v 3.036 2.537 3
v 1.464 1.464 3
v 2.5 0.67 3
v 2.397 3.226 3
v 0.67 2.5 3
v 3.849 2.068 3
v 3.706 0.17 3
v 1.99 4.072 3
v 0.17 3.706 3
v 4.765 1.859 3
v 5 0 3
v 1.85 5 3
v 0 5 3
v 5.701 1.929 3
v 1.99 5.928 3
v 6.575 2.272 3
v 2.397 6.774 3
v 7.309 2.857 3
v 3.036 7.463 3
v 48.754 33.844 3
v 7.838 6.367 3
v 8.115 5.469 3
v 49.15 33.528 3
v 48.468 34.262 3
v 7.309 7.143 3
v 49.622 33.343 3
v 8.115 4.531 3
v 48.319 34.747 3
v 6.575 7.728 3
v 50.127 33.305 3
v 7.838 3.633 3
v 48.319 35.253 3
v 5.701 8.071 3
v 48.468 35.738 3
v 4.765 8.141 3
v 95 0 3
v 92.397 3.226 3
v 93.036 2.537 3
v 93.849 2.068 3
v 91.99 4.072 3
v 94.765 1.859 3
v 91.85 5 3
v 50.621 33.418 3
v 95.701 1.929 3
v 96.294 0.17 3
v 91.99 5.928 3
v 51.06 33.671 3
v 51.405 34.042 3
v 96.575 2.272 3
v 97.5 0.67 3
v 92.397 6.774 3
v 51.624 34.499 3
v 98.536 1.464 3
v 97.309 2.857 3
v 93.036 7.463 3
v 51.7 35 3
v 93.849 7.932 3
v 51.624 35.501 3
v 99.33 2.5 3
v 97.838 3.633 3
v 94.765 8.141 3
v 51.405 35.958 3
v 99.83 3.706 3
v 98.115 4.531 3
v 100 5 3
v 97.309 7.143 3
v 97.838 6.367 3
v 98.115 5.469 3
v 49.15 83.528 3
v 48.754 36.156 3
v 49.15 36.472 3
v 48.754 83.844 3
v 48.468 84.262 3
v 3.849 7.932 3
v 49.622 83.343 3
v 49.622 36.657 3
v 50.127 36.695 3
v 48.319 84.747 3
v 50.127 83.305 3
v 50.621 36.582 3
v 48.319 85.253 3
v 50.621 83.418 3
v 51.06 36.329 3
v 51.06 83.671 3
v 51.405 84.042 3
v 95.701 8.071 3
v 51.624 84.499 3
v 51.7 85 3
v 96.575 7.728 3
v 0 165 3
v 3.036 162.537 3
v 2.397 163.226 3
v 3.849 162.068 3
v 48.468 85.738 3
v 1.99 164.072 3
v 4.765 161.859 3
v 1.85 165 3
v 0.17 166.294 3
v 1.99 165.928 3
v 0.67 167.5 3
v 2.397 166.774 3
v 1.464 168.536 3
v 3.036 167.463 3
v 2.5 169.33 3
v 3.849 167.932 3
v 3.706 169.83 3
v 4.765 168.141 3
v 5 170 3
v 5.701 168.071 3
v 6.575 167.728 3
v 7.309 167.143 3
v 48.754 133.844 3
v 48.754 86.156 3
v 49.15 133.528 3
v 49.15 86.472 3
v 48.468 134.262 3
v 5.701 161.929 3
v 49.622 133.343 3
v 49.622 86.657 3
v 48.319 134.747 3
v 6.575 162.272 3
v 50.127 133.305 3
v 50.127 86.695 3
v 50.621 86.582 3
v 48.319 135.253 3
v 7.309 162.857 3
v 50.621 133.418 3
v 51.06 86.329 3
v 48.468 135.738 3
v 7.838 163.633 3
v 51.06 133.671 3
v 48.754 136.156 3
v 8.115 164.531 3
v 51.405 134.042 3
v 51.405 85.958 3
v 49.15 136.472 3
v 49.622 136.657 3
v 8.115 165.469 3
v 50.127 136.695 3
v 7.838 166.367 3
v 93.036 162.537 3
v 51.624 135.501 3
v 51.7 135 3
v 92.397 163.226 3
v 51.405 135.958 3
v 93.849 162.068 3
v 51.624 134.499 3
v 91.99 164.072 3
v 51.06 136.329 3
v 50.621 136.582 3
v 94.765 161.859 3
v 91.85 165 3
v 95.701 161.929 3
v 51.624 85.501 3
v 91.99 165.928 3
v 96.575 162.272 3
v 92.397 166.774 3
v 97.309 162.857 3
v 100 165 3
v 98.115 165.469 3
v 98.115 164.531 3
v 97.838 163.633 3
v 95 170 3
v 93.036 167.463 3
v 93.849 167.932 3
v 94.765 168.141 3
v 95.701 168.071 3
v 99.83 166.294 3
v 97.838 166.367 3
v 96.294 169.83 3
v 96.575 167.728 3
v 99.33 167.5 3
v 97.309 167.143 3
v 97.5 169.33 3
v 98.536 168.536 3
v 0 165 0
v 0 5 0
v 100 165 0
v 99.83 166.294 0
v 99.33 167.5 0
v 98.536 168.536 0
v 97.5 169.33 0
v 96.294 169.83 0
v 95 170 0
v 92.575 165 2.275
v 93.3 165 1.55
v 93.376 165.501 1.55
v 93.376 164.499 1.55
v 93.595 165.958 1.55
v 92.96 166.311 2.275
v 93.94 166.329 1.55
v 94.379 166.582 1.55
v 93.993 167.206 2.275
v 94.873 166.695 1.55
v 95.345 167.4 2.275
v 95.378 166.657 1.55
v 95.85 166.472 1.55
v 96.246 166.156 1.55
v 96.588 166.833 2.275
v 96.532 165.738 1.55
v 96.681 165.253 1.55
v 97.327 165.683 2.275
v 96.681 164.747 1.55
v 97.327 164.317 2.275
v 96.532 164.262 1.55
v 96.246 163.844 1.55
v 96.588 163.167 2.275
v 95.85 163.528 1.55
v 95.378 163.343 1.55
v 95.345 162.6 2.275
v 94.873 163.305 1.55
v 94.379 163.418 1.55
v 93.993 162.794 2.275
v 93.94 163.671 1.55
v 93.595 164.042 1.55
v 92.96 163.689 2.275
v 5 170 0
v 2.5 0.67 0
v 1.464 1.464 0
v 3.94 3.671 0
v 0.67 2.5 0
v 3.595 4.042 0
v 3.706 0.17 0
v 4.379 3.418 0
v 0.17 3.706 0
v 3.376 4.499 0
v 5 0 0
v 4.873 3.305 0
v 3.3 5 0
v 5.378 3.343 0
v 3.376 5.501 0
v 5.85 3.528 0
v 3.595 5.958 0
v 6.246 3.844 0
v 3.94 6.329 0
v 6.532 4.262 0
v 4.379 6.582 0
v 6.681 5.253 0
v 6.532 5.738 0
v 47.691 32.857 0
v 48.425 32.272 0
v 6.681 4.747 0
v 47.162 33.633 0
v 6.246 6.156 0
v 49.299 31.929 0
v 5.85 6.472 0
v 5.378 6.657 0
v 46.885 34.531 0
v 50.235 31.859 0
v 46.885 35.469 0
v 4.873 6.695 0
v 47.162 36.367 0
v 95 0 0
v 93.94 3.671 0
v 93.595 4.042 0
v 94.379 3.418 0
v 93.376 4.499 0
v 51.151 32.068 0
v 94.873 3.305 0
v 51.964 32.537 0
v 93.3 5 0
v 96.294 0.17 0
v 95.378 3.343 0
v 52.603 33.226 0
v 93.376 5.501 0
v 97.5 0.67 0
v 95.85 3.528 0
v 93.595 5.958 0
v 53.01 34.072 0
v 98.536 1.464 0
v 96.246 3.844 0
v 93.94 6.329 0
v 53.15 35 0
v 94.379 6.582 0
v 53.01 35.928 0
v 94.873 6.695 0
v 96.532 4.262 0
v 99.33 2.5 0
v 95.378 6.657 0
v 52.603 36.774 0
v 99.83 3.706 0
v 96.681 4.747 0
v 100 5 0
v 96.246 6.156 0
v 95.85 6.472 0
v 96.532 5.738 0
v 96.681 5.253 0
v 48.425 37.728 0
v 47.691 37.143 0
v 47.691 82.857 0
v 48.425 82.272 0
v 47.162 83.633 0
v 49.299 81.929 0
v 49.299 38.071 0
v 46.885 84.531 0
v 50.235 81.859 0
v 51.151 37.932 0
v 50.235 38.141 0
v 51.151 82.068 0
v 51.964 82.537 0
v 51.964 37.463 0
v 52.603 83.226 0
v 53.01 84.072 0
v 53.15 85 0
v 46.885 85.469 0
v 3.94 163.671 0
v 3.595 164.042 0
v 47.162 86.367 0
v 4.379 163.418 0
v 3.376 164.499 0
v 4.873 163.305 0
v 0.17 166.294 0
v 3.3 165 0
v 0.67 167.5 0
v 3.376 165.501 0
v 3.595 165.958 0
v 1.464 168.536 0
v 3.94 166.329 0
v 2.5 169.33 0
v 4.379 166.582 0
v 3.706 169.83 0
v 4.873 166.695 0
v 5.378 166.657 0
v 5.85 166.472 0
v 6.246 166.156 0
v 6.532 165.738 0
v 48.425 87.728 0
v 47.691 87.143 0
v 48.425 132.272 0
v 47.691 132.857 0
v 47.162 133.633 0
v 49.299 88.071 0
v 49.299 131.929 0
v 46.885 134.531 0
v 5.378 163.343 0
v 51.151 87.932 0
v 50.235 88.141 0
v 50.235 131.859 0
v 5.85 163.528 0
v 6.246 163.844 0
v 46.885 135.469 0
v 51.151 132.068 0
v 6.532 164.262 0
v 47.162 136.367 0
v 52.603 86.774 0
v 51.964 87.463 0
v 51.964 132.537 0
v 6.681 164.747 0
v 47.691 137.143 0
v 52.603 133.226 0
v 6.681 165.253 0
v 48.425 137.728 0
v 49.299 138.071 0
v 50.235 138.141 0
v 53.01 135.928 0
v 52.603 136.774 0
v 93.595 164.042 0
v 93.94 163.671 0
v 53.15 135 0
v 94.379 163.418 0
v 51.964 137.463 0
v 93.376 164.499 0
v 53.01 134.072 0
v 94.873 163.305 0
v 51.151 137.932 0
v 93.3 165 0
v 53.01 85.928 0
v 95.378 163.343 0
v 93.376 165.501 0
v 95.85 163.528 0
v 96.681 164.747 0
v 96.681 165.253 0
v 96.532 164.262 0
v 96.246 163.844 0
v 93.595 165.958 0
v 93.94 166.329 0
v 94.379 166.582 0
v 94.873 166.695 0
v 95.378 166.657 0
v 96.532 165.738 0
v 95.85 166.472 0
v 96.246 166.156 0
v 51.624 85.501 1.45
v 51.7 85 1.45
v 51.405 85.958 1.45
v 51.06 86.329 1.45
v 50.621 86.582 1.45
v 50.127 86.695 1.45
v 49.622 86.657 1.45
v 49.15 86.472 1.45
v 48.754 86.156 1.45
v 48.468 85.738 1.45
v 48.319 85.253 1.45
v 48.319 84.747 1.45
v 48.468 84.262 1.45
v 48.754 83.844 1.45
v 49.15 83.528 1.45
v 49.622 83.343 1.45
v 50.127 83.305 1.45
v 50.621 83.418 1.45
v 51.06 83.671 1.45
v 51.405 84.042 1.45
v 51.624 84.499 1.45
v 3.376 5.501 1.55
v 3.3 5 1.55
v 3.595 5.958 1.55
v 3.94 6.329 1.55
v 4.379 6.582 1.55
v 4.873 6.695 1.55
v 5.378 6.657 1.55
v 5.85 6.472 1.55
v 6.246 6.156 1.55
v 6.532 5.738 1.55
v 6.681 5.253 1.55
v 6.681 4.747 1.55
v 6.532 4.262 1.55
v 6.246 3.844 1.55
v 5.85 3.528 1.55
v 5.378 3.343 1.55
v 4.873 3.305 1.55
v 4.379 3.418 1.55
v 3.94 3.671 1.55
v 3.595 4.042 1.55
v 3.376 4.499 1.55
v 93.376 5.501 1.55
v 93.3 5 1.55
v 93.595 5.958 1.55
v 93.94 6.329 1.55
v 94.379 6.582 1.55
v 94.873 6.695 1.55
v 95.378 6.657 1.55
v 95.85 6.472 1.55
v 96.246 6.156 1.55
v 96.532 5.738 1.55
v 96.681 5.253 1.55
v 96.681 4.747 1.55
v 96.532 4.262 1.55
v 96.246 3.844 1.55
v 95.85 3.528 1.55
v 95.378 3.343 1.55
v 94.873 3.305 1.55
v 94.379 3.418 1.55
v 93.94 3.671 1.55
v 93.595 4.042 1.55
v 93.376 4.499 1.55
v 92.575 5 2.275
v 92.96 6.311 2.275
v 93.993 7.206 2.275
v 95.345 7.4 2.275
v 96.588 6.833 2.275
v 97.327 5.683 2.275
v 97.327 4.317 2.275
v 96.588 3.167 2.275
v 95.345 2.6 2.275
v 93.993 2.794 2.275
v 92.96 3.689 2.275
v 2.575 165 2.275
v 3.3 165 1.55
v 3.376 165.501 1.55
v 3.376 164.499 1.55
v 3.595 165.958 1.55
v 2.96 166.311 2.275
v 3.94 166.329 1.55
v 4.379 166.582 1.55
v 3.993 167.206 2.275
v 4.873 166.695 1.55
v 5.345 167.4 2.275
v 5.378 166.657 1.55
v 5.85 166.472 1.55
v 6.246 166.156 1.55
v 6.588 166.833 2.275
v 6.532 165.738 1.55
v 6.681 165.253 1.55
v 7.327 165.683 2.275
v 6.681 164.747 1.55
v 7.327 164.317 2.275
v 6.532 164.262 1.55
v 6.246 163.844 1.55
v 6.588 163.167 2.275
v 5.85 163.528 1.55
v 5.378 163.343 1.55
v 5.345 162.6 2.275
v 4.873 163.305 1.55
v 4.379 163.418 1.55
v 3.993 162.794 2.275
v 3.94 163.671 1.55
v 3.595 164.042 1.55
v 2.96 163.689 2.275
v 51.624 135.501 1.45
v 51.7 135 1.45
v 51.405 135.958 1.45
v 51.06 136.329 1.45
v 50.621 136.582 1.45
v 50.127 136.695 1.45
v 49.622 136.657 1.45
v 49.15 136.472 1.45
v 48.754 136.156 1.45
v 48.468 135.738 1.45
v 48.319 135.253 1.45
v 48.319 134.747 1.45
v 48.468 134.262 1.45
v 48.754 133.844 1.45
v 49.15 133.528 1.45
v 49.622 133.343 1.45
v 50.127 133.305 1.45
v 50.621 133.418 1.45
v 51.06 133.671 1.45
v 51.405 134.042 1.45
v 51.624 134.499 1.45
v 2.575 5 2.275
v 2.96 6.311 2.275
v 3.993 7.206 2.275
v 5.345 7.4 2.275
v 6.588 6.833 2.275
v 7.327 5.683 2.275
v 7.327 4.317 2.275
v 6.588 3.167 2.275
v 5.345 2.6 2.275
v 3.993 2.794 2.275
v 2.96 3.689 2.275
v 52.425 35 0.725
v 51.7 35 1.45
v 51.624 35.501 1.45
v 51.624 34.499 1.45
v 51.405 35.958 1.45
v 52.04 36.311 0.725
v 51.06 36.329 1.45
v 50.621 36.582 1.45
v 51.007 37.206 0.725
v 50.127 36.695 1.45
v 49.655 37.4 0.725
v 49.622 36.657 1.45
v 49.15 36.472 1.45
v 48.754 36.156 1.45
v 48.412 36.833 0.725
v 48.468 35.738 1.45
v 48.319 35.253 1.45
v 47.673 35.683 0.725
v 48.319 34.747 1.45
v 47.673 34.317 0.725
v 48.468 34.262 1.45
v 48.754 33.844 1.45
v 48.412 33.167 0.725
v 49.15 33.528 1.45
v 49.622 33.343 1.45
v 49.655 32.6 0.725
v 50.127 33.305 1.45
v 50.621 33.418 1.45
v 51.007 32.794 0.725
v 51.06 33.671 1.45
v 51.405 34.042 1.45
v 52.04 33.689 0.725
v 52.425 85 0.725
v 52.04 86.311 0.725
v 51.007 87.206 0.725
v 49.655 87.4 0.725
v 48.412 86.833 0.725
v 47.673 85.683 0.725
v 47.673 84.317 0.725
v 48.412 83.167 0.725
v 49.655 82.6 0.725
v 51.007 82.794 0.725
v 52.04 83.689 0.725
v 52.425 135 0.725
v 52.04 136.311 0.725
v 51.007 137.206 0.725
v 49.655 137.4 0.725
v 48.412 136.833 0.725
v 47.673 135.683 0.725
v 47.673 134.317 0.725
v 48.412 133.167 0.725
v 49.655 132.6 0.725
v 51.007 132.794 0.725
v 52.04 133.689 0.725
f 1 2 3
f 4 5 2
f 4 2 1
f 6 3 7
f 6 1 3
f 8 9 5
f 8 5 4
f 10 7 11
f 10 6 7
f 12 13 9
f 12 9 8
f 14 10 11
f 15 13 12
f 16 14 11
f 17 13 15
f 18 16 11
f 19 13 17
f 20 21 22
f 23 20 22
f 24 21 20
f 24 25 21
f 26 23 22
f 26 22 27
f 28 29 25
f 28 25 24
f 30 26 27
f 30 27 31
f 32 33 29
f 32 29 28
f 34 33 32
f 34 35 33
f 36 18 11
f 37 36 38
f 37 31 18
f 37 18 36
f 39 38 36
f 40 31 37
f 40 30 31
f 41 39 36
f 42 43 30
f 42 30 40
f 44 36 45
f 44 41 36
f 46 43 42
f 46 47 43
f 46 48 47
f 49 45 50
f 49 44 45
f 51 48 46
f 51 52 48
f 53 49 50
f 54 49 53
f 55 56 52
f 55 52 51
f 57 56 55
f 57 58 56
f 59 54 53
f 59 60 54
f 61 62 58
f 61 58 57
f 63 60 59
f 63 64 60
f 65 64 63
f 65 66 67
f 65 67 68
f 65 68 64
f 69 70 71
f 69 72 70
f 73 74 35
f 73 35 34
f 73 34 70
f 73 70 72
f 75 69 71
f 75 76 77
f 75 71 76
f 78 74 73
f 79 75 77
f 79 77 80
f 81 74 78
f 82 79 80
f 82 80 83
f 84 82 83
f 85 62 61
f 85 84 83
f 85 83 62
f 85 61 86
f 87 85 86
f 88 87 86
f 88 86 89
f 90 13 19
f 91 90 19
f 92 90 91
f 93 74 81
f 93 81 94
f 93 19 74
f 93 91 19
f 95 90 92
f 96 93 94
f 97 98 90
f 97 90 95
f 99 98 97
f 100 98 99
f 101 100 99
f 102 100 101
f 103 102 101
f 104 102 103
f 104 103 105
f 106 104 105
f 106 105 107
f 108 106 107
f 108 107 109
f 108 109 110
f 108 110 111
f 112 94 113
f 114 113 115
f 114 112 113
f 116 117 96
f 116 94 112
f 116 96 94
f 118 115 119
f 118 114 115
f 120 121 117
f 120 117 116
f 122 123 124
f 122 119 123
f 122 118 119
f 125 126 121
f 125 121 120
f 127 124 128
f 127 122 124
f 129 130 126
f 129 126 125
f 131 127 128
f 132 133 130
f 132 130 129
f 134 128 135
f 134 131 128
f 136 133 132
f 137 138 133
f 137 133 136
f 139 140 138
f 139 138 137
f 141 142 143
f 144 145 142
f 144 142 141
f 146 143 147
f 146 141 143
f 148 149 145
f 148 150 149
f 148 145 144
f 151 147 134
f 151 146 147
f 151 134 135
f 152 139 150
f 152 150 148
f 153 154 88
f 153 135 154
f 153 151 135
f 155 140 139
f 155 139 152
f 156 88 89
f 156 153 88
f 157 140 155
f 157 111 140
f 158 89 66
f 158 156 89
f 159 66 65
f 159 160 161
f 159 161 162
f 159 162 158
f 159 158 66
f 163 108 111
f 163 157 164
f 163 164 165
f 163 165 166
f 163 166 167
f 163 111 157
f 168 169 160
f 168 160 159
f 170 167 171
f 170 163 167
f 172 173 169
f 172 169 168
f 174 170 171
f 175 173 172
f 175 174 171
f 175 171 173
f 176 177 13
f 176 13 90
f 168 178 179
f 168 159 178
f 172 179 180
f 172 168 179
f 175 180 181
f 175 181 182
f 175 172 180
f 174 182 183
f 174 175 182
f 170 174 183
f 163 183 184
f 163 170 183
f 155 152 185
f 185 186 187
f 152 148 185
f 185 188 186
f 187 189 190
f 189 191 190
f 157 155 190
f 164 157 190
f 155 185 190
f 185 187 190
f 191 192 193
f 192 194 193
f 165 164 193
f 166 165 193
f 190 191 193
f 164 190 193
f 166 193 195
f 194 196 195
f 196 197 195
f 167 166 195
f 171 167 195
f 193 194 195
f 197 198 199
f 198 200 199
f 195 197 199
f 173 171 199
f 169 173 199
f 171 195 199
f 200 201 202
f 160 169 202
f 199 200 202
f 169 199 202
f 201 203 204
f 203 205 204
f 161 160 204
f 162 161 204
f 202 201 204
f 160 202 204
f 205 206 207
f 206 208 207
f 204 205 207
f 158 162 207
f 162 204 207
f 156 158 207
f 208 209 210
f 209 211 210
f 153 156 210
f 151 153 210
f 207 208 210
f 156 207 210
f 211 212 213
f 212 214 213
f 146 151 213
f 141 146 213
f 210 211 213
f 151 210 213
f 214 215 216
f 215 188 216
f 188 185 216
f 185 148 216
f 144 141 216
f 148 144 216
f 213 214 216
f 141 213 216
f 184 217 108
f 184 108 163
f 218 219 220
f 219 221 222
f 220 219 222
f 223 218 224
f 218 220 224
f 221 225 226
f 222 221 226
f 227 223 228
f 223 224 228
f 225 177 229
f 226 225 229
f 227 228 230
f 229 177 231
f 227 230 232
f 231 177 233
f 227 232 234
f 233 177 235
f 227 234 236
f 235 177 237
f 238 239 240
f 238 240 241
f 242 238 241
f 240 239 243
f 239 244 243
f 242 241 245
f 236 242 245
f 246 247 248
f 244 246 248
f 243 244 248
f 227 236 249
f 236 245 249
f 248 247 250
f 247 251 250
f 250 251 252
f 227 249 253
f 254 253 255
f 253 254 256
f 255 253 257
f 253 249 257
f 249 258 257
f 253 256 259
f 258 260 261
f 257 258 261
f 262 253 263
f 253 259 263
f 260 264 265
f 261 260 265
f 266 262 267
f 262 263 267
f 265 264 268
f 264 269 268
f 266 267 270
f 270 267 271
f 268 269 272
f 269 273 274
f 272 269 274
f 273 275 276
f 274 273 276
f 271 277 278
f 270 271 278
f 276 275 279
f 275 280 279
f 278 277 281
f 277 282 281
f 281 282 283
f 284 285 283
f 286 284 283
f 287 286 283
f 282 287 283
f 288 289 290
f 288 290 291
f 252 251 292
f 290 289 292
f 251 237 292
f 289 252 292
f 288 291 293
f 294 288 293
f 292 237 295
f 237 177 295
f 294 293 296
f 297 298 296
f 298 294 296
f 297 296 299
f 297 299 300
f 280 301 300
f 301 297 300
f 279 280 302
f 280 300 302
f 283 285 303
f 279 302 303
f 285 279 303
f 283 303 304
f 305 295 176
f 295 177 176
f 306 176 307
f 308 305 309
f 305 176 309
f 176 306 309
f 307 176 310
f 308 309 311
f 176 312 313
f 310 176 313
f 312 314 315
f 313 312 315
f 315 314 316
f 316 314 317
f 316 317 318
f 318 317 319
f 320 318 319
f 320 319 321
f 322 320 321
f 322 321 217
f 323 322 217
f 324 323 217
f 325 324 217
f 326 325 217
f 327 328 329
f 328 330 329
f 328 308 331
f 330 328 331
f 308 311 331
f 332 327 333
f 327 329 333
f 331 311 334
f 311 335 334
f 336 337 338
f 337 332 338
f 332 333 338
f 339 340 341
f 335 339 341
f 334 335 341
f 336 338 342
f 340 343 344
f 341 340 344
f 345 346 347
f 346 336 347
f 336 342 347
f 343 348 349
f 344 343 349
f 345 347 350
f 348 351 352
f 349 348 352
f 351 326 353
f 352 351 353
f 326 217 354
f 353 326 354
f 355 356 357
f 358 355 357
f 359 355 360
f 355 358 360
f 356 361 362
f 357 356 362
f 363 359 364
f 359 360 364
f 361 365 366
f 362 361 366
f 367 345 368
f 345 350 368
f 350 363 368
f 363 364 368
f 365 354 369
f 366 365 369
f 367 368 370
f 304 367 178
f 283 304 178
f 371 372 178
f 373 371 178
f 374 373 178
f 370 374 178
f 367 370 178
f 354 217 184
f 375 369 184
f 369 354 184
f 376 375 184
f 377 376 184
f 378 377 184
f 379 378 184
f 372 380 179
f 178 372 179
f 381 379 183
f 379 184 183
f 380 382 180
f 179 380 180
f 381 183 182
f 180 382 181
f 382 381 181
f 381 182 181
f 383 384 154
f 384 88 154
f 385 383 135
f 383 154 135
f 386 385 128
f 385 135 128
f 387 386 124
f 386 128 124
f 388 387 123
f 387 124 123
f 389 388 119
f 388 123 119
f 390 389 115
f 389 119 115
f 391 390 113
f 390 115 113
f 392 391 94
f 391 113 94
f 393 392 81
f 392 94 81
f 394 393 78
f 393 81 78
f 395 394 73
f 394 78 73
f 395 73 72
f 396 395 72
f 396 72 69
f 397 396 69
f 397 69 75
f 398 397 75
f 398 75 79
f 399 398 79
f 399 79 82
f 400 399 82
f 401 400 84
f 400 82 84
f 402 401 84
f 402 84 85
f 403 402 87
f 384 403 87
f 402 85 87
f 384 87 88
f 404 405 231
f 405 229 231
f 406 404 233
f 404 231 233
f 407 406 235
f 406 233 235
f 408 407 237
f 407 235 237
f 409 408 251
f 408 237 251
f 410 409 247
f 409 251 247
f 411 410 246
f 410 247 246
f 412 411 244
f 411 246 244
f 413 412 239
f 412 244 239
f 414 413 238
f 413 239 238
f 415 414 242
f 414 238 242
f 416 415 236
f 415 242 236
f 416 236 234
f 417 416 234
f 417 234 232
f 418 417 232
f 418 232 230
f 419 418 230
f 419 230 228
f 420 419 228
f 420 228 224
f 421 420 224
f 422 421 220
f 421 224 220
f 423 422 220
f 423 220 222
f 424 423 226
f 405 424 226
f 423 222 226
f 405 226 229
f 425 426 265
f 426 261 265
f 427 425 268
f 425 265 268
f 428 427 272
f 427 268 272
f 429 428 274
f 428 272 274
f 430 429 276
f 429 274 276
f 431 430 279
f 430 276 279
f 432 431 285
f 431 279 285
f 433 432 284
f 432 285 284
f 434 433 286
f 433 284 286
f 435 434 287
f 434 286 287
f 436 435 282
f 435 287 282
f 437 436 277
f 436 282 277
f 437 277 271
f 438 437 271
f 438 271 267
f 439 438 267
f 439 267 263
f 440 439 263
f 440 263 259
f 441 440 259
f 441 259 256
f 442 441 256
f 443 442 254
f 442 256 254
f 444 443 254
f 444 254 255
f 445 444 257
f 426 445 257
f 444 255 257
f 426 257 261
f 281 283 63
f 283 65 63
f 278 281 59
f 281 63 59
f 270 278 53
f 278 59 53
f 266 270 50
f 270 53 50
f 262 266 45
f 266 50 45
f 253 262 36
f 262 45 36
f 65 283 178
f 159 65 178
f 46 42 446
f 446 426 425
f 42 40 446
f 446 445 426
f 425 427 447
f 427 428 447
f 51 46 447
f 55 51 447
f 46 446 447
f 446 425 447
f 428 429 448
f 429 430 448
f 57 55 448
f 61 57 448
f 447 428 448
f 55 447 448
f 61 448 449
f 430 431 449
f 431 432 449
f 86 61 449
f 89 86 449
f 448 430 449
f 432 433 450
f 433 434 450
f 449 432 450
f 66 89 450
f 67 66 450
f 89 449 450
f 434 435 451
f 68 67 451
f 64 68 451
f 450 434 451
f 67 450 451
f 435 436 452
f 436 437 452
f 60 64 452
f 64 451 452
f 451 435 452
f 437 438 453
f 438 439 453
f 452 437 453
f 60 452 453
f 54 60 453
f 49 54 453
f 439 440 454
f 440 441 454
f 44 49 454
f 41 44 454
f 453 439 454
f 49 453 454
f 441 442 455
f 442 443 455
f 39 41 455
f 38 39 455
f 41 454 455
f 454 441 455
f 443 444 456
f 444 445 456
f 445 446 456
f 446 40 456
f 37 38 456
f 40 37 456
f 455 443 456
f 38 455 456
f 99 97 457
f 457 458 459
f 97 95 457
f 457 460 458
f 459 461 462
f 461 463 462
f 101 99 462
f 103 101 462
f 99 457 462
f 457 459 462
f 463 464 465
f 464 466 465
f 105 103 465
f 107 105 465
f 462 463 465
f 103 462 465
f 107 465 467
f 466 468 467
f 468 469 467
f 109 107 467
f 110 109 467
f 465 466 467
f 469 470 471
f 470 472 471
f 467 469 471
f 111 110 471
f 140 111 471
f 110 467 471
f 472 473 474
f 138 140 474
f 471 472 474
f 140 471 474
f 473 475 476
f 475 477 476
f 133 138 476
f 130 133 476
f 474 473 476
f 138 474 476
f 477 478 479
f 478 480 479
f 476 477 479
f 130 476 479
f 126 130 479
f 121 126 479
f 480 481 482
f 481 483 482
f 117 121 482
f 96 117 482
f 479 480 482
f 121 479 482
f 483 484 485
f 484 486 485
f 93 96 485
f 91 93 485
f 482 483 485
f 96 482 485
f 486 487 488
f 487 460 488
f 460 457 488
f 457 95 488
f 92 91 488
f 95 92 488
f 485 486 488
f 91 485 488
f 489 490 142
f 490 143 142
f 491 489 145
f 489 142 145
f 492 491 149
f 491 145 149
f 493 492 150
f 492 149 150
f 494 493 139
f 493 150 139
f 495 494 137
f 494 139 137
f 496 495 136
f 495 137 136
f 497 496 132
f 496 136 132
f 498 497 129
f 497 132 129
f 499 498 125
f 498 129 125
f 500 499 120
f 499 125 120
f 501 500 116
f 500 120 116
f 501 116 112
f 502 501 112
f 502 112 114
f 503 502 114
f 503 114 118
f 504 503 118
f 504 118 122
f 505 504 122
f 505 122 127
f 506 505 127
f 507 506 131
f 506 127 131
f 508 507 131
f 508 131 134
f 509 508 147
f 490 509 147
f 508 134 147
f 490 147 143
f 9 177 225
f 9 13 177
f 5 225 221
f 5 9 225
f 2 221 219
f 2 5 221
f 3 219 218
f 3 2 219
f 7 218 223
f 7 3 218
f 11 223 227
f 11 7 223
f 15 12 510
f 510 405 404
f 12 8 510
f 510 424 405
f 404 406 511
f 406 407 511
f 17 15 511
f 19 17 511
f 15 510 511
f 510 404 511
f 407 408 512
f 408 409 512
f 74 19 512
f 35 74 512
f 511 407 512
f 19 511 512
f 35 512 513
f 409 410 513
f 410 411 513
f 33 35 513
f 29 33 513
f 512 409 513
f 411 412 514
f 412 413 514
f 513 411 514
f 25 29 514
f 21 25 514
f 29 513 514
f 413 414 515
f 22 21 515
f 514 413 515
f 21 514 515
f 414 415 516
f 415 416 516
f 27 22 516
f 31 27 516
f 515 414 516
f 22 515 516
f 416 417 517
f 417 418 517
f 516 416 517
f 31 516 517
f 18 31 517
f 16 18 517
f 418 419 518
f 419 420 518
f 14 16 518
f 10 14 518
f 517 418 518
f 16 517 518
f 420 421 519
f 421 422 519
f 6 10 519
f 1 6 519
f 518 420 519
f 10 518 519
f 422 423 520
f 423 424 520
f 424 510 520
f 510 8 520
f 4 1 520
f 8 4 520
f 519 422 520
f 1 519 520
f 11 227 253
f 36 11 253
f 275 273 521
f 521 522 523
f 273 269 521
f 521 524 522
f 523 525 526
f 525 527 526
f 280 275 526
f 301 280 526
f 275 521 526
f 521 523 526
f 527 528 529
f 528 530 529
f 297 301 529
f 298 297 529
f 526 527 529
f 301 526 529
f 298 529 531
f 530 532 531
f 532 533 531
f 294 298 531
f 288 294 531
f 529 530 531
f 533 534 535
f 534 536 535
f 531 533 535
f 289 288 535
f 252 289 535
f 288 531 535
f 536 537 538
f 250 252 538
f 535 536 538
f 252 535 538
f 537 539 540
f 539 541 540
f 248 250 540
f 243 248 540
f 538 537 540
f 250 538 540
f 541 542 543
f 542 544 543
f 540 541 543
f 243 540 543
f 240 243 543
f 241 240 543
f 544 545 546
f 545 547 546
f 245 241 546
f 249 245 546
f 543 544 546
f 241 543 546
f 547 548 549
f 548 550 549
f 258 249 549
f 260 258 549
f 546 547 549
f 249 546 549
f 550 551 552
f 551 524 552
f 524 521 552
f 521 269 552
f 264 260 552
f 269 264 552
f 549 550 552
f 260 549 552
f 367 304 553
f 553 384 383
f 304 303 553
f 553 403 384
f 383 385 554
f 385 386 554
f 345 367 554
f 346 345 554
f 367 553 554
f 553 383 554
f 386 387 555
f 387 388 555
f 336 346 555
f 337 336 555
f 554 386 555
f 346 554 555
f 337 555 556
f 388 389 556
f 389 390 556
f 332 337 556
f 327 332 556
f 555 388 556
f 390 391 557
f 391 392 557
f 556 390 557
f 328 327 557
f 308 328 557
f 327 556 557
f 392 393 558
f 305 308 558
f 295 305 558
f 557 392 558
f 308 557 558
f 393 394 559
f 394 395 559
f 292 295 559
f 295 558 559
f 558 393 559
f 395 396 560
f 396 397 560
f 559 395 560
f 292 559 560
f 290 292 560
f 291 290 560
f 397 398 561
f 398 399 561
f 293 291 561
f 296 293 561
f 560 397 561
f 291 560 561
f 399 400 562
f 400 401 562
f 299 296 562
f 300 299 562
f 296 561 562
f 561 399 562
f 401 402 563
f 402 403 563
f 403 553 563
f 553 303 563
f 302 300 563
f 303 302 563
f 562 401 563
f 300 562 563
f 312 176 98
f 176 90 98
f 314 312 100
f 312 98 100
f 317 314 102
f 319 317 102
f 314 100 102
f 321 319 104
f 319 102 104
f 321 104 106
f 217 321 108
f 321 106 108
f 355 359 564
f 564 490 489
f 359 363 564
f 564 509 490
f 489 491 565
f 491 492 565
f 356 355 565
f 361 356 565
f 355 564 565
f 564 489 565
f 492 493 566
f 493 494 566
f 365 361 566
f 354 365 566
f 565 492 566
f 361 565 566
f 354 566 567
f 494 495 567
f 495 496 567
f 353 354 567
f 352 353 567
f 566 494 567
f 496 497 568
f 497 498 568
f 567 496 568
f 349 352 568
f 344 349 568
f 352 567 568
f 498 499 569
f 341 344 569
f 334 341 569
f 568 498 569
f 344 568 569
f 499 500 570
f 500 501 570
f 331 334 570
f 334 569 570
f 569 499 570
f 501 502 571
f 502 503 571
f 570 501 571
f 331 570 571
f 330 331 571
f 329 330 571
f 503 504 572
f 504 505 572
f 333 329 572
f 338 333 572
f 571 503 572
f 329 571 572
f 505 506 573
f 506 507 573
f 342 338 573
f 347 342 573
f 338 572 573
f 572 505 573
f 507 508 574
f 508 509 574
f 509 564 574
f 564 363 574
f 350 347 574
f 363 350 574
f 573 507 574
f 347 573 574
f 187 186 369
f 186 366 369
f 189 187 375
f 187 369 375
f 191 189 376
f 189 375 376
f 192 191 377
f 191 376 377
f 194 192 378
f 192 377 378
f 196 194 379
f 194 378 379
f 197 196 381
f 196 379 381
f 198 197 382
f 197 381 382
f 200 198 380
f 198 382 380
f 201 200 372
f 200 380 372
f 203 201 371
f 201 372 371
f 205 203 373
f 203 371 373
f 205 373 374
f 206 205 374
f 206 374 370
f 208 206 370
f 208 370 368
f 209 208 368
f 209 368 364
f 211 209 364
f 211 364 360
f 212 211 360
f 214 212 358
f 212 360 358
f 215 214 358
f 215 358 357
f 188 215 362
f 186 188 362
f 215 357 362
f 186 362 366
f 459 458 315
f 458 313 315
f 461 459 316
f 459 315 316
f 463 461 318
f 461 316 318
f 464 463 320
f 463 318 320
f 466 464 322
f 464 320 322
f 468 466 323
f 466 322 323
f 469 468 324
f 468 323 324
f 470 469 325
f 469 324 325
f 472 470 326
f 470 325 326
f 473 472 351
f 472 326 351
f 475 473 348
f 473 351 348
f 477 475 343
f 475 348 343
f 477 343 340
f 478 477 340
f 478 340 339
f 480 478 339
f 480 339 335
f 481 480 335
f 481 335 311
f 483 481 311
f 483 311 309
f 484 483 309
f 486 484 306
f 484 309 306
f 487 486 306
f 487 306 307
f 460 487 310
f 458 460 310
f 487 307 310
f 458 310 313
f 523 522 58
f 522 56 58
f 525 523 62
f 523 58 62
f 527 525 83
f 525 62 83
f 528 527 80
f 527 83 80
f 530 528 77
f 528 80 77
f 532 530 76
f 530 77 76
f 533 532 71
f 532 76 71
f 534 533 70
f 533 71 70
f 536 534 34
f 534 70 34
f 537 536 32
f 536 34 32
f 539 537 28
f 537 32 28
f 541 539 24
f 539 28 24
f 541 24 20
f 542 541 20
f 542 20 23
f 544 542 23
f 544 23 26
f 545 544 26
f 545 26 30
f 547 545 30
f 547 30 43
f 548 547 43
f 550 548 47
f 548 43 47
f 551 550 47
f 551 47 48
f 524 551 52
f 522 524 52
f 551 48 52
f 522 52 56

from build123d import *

# Parameters (mm, degrees)
SKETCH1_W                                       = 100
SKETCH1_H                                       = 170
BOSS_EXTRUDE1_DEPTH                             = 3
CSK_FOR_M3_FLAT_HEAD_MACHINE_SCREW1_D           = 3.4
CSK_FOR_M3_FLAT_HEAD_MACHINE_SCREW1_DEPTH       = 7.5
CSK_FOR_M3_FLAT_HEAD_MACHINE_SCREW1_CSINK_D     = 6.3
CSK_FOR_M3_FLAT_HEAD_MACHINE_SCREW1_CSINK_ANGLE = 90
CSK_FOR_M3_FLAT_HEAD_MACHINE_SCREW1_TIP         = 1.021463052
FILLET1_R                                       = 5
CSK_FOR_M3_FLAT_HEAD_MACHINE_SCREW2_D           = 3.4
CSK_FOR_M3_FLAT_HEAD_MACHINE_SCREW2_DEPTH       = 7.5
CSK_FOR_M3_FLAT_HEAD_MACHINE_SCREW2_CSINK_D     = 6.3
CSK_FOR_M3_FLAT_HEAD_MACHINE_SCREW2_CSINK_ANGLE = 90
CSK_FOR_M3_FLAT_HEAD_MACHINE_SCREW2_TIP         = 1.021463052


with BuildPart() as part:
    # Sketch1 → Boss-Extrude1 (new body)
    with BuildSketch(Plane.XY):
        with Locations((50, 85)):
            Rectangle(SKETCH1_W, SKETCH1_H)
    extrude(amount=BOSS_EXTRUDE1_DEPTH)

    # CSK for M3 Flat Head Machine Screw1
    with Locations(Plane.XY.offset(3)):
        with Locations((5, 165), (95, 165), (95, 5), (5, 5)):
            CounterSinkHole(CSK_FOR_M3_FLAT_HEAD_MACHINE_SCREW1_D / 2, CSK_FOR_M3_FLAT_HEAD_MACHINE_SCREW1_CSINK_D / 2, depth=CSK_FOR_M3_FLAT_HEAD_MACHINE_SCREW1_DEPTH, counter_sink_angle=CSK_FOR_M3_FLAT_HEAD_MACHINE_SCREW1_CSINK_ANGLE)
            with Locations((0, 0, -(CSK_FOR_M3_FLAT_HEAD_MACHINE_SCREW1_DEPTH + CSK_FOR_M3_FLAT_HEAD_MACHINE_SCREW1_TIP / 2))):  # 118° drill point
                Cone(0, CSK_FOR_M3_FLAT_HEAD_MACHINE_SCREW1_D / 2, CSK_FOR_M3_FLAT_HEAD_MACHINE_SCREW1_TIP, mode=Mode.SUBTRACT)

    # Fillet1
    fillet1_edges = [part.edges().sort_by_distance(p)[0] for p in [
        (0, 170, 1.5),
        (100, 170, 1.5),
        (100, 0, 1.5),
        (0, 0, 1.5),
    ]]
    fillet(fillet1_edges, radius=FILLET1_R)

    # CSK for M3 Flat Head Machine Screw2
    with Locations(Plane(origin=(0, 0, 0), x_dir=(-1, 0, 0), z_dir=(0, 0, -1))):
        with Locations((-50, 135), (-50, 85), (-50, 35)):
            CounterSinkHole(CSK_FOR_M3_FLAT_HEAD_MACHINE_SCREW2_D / 2, CSK_FOR_M3_FLAT_HEAD_MACHINE_SCREW2_CSINK_D / 2, depth=CSK_FOR_M3_FLAT_HEAD_MACHINE_SCREW2_DEPTH, counter_sink_angle=CSK_FOR_M3_FLAT_HEAD_MACHINE_SCREW2_CSINK_ANGLE)
            with Locations((0, 0, -(CSK_FOR_M3_FLAT_HEAD_MACHINE_SCREW2_DEPTH + CSK_FOR_M3_FLAT_HEAD_MACHINE_SCREW2_TIP / 2))):  # 118° drill point
                Cone(0, CSK_FOR_M3_FLAT_HEAD_MACHINE_SCREW2_D / 2, CSK_FOR_M3_FLAT_HEAD_MACHINE_SCREW2_TIP, mode=Mode.SUBTRACT)


solid = part.part
